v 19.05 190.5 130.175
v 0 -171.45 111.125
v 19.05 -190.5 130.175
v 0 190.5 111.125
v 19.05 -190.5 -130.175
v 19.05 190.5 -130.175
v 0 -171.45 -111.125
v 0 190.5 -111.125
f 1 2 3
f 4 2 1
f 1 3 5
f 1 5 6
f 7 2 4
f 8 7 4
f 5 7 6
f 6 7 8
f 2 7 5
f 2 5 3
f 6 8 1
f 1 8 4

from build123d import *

# Parameters (mm, degrees)
F0_W     = 381
F0_H     = 260.35
F1_DEPTH = 19.05
F2_SIZE  = 19.04999


# Not quite as in the source:
# - a fillet or chamfer is up to 0.001 mm smaller than in the source, because OpenCascade refuses the exact size


with BuildPart() as f1:
    # F0 (on Right) → F1 (new body)
    with BuildSketch(Plane.YZ):
        Rectangle(F0_W, F0_H)
    extrude(amount=F1_DEPTH)

    # F2 (size 19.05 in the source; OpenCascade refuses exactly that, so slightly less here)
    f2_edges = [f1.edges().sort_by_distance(p)[0] for p in [
        (0, 0, -130.175),
        (0, 0, 130.175),
        (0, -190.5, 0),
    ]]
    chamfer(f2_edges, length=F2_SIZE)


solid = f1.part
